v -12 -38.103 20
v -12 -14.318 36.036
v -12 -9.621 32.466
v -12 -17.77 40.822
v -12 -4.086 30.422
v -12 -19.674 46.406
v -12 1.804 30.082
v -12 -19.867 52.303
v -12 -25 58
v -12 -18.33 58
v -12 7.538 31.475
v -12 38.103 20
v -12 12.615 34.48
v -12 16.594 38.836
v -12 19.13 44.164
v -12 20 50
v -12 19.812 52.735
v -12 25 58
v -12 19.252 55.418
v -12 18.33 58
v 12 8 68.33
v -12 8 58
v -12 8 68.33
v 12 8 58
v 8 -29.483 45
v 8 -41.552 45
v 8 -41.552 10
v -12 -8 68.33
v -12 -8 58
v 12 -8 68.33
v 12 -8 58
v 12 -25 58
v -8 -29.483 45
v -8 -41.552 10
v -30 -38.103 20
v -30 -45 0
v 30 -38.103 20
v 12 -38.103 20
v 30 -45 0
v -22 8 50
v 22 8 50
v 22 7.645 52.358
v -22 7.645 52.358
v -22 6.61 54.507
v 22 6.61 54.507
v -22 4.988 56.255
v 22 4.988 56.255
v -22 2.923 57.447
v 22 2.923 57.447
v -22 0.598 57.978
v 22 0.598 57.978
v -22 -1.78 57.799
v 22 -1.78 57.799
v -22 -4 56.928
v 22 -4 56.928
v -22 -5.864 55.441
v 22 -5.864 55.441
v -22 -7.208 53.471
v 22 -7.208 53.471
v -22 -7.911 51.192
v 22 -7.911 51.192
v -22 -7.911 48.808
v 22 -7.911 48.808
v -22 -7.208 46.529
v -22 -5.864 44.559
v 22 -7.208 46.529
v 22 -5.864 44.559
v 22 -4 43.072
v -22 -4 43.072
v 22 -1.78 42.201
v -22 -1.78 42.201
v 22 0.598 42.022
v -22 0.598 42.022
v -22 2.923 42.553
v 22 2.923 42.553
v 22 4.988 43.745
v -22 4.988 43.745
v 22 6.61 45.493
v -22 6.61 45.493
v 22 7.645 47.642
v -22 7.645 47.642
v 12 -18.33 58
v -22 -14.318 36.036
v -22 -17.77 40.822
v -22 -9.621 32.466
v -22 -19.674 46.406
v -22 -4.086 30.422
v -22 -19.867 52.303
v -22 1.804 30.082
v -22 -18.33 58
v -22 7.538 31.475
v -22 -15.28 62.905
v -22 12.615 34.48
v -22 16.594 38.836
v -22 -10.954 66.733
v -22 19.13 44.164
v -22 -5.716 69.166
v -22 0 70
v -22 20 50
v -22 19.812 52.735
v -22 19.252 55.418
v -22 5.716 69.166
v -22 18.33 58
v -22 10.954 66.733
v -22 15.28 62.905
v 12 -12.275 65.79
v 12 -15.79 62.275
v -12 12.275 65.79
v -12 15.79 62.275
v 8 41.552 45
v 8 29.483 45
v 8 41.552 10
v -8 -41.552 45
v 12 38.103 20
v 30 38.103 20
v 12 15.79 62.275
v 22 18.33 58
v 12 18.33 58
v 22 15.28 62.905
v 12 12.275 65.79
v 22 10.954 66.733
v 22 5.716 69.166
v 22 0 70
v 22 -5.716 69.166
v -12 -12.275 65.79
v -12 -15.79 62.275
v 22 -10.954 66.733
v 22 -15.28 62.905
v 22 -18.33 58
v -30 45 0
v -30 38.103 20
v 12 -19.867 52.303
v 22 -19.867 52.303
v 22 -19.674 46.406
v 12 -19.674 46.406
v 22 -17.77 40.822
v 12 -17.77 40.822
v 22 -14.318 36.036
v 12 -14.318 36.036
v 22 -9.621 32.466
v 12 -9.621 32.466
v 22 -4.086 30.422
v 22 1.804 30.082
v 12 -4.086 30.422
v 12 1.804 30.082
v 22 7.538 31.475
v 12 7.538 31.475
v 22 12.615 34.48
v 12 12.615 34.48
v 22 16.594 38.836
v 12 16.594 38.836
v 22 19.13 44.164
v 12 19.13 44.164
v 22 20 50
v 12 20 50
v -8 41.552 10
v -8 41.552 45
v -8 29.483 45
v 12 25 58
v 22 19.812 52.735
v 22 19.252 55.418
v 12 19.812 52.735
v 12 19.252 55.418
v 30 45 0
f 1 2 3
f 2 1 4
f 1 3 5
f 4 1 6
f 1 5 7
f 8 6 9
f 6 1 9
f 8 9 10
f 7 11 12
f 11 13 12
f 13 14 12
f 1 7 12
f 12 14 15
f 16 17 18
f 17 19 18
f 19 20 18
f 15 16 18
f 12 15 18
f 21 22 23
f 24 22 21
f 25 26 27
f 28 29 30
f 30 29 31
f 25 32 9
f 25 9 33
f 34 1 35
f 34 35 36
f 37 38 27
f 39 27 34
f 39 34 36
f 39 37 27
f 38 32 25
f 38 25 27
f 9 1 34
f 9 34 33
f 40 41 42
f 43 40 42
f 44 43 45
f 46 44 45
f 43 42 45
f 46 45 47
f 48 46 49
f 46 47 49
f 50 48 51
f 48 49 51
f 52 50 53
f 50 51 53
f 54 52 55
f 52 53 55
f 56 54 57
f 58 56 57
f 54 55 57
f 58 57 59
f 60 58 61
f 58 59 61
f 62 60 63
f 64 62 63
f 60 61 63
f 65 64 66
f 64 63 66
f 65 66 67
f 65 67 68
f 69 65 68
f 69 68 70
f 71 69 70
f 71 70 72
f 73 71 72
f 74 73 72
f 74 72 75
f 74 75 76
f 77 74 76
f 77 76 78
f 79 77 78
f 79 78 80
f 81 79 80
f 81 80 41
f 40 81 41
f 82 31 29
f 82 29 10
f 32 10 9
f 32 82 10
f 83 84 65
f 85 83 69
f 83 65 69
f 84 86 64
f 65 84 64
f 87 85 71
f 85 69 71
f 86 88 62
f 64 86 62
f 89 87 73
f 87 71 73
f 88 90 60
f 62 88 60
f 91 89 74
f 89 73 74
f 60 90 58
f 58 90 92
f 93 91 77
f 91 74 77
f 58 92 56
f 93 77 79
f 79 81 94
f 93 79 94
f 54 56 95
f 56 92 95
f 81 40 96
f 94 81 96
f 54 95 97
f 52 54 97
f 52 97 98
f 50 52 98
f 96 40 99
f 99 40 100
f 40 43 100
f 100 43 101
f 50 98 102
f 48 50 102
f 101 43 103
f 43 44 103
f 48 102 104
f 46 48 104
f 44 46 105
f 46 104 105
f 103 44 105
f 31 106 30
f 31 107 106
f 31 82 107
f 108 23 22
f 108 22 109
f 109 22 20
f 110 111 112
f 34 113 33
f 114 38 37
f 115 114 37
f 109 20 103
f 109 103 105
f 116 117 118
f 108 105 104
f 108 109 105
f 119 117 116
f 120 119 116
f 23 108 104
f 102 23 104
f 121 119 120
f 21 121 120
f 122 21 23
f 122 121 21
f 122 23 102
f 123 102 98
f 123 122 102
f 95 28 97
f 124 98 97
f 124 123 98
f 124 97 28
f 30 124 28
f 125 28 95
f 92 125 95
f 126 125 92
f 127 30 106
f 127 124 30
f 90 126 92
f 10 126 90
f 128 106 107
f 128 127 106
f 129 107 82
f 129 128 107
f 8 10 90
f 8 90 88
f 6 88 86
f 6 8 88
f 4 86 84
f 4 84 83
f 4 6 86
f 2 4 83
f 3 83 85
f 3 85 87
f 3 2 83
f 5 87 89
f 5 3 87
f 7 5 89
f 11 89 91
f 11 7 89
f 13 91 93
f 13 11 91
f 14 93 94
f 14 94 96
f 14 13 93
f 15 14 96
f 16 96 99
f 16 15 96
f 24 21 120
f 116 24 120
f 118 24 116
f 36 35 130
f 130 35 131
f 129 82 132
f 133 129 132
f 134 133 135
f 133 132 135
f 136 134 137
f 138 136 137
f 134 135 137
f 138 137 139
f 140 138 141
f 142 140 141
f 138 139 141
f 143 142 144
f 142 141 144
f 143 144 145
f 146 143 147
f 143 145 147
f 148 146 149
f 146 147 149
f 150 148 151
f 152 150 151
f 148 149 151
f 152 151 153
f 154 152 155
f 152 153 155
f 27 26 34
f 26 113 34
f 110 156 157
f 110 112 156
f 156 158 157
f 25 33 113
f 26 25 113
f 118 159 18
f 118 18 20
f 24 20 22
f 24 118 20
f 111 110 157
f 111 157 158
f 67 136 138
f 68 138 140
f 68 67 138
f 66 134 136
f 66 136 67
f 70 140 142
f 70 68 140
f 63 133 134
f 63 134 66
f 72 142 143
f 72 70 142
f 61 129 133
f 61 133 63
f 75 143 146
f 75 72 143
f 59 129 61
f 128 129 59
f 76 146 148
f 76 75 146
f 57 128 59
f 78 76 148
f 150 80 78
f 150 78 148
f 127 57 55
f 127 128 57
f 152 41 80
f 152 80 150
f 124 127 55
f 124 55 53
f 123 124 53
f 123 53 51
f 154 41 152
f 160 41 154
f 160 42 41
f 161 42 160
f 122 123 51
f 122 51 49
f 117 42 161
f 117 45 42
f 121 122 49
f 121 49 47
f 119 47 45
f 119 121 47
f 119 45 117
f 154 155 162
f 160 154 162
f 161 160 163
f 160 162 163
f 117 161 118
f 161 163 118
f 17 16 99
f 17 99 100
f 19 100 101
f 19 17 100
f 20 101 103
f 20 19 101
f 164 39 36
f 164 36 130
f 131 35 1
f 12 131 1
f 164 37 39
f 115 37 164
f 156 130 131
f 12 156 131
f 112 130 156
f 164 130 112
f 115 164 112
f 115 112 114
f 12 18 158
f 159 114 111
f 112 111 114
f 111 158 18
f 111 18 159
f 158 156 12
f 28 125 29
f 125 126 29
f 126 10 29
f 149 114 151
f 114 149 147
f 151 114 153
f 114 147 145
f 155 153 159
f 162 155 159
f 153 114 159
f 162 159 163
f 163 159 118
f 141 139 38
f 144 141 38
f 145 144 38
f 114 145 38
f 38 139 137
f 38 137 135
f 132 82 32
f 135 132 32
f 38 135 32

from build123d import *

# Parameters (mm, degrees)
F1_DEPTH      = 30
F2_W          = 18
F2_H          = 20
F2_H_2        = 50
F3_DEPTH      = 25
F2_H_3        = 90
F4_DEPTH      = 38
F6_DEPTH      = 8
F7_DEPTH      = 8
F9_DEPTH      = 10
F9_DEPTH_BACK = 34
F10_W         = 24
F10_H         = 17
F11_DEPTH     = 10.3313027798
F12_R         = 8
F13_DEPTH     = 52.001


with BuildPart() as f1:
    # F0 (on Right) → F1 (new body, symmetric)
    with BuildSketch(Plane.YZ):
        Polygon((-25, 58), (-45, 0), (45, 0), (25, 58), align=None)
    extrude(amount=F1_DEPTH, both=True)

    # F2 (on face) → F3 (cut)
    with BuildSketch(Plane.XY.offset(58)):
        with Locations((21, -35)):
            Rectangle(F2_W, F2_H)
        with Locations((21, 0)):
            Rectangle(F2_W, F2_H_2)
        with Locations((21, 35)):
            Rectangle(F2_W, F2_H)
    extrude(amount=-F3_DEPTH, mode=Mode.SUBTRACT)

    # F2 (on face) → F4 (cut)
    with BuildSketch(Plane.XY.offset(58)):
        with Locations((21, 0)):
            Rectangle(F2_W, F2_H_3)
        with Locations((-21, 0)):
            Rectangle(F2_W, F2_H_3)
    extrude(amount=-F4_DEPTH, mode=Mode.SUBTRACT)

    # F5 (on Right) → F6 (join, symmetric)
    with BuildSketch(Plane.YZ):
        Polygon((-29.4827586207, 45), (-41.5517241379, 45), (-41.5517241379, 10), align=None)
        Polygon((41.5517241379, 10), (41.5517241379, 45), (29.4827586207, 45), align=None)
    extrude(amount=F6_DEPTH, both=True)

    # F5 (on Right) → F7 (join, symmetric)
    with BuildSketch(Plane.YZ):
        Polygon((-29.4827586207, 45), (-41.5517241379, 45), (-41.5517241379, 10), align=None)
        Polygon((41.5517241379, 10), (41.5517241379, 45), (29.4827586207, 45), align=None)
    extrude(amount=F7_DEPTH, both=True)

    # F8 (on face) → F9 (join, two sides)
    with BuildSketch(Plane.YZ.offset(12)) as f9_sk:
        with BuildLine():
            ThreePointArc((-18.3303027798, 58), (-4.0861928738, 30.4218737414), (20, 50))
            ThreePointArc((20, 50), (19.5781262586, 54.0861928738), (18.3303027798, 58))
            Line((18.3303027798, 58), (-18.3303027798, 58))
        make_face()
        with BuildLine():
            Line((-18.3303027798, 58), (18.3303027798, 58))
            ThreePointArc((18.3303027798, 58), (0, 70), (-18.3303027798, 58))
        make_face()
    extrude(amount=F9_DEPTH)
    extrude(f9_sk.sketch, amount=-F9_DEPTH_BACK)

    # F10 (on face) → F11 (cut, through all)
    with BuildSketch(Plane.XY.offset(58)):
        with Locations((0, -16.5)):
            Rectangle(F10_W, F10_H)
        with Locations((0, 16.5)):
            Rectangle(F10_W, F10_H)
    extrude(amount=F11_DEPTH, mode=Mode.SUBTRACT)

    # F12 (on face) → F13 (cut, through all)
    with BuildSketch(Plane.YZ.offset(22)):
        with Locations((0, 50)):
            Circle(F12_R)
    extrude(amount=-F13_DEPTH, mode=Mode.SUBTRACT)


solid = f1.part
